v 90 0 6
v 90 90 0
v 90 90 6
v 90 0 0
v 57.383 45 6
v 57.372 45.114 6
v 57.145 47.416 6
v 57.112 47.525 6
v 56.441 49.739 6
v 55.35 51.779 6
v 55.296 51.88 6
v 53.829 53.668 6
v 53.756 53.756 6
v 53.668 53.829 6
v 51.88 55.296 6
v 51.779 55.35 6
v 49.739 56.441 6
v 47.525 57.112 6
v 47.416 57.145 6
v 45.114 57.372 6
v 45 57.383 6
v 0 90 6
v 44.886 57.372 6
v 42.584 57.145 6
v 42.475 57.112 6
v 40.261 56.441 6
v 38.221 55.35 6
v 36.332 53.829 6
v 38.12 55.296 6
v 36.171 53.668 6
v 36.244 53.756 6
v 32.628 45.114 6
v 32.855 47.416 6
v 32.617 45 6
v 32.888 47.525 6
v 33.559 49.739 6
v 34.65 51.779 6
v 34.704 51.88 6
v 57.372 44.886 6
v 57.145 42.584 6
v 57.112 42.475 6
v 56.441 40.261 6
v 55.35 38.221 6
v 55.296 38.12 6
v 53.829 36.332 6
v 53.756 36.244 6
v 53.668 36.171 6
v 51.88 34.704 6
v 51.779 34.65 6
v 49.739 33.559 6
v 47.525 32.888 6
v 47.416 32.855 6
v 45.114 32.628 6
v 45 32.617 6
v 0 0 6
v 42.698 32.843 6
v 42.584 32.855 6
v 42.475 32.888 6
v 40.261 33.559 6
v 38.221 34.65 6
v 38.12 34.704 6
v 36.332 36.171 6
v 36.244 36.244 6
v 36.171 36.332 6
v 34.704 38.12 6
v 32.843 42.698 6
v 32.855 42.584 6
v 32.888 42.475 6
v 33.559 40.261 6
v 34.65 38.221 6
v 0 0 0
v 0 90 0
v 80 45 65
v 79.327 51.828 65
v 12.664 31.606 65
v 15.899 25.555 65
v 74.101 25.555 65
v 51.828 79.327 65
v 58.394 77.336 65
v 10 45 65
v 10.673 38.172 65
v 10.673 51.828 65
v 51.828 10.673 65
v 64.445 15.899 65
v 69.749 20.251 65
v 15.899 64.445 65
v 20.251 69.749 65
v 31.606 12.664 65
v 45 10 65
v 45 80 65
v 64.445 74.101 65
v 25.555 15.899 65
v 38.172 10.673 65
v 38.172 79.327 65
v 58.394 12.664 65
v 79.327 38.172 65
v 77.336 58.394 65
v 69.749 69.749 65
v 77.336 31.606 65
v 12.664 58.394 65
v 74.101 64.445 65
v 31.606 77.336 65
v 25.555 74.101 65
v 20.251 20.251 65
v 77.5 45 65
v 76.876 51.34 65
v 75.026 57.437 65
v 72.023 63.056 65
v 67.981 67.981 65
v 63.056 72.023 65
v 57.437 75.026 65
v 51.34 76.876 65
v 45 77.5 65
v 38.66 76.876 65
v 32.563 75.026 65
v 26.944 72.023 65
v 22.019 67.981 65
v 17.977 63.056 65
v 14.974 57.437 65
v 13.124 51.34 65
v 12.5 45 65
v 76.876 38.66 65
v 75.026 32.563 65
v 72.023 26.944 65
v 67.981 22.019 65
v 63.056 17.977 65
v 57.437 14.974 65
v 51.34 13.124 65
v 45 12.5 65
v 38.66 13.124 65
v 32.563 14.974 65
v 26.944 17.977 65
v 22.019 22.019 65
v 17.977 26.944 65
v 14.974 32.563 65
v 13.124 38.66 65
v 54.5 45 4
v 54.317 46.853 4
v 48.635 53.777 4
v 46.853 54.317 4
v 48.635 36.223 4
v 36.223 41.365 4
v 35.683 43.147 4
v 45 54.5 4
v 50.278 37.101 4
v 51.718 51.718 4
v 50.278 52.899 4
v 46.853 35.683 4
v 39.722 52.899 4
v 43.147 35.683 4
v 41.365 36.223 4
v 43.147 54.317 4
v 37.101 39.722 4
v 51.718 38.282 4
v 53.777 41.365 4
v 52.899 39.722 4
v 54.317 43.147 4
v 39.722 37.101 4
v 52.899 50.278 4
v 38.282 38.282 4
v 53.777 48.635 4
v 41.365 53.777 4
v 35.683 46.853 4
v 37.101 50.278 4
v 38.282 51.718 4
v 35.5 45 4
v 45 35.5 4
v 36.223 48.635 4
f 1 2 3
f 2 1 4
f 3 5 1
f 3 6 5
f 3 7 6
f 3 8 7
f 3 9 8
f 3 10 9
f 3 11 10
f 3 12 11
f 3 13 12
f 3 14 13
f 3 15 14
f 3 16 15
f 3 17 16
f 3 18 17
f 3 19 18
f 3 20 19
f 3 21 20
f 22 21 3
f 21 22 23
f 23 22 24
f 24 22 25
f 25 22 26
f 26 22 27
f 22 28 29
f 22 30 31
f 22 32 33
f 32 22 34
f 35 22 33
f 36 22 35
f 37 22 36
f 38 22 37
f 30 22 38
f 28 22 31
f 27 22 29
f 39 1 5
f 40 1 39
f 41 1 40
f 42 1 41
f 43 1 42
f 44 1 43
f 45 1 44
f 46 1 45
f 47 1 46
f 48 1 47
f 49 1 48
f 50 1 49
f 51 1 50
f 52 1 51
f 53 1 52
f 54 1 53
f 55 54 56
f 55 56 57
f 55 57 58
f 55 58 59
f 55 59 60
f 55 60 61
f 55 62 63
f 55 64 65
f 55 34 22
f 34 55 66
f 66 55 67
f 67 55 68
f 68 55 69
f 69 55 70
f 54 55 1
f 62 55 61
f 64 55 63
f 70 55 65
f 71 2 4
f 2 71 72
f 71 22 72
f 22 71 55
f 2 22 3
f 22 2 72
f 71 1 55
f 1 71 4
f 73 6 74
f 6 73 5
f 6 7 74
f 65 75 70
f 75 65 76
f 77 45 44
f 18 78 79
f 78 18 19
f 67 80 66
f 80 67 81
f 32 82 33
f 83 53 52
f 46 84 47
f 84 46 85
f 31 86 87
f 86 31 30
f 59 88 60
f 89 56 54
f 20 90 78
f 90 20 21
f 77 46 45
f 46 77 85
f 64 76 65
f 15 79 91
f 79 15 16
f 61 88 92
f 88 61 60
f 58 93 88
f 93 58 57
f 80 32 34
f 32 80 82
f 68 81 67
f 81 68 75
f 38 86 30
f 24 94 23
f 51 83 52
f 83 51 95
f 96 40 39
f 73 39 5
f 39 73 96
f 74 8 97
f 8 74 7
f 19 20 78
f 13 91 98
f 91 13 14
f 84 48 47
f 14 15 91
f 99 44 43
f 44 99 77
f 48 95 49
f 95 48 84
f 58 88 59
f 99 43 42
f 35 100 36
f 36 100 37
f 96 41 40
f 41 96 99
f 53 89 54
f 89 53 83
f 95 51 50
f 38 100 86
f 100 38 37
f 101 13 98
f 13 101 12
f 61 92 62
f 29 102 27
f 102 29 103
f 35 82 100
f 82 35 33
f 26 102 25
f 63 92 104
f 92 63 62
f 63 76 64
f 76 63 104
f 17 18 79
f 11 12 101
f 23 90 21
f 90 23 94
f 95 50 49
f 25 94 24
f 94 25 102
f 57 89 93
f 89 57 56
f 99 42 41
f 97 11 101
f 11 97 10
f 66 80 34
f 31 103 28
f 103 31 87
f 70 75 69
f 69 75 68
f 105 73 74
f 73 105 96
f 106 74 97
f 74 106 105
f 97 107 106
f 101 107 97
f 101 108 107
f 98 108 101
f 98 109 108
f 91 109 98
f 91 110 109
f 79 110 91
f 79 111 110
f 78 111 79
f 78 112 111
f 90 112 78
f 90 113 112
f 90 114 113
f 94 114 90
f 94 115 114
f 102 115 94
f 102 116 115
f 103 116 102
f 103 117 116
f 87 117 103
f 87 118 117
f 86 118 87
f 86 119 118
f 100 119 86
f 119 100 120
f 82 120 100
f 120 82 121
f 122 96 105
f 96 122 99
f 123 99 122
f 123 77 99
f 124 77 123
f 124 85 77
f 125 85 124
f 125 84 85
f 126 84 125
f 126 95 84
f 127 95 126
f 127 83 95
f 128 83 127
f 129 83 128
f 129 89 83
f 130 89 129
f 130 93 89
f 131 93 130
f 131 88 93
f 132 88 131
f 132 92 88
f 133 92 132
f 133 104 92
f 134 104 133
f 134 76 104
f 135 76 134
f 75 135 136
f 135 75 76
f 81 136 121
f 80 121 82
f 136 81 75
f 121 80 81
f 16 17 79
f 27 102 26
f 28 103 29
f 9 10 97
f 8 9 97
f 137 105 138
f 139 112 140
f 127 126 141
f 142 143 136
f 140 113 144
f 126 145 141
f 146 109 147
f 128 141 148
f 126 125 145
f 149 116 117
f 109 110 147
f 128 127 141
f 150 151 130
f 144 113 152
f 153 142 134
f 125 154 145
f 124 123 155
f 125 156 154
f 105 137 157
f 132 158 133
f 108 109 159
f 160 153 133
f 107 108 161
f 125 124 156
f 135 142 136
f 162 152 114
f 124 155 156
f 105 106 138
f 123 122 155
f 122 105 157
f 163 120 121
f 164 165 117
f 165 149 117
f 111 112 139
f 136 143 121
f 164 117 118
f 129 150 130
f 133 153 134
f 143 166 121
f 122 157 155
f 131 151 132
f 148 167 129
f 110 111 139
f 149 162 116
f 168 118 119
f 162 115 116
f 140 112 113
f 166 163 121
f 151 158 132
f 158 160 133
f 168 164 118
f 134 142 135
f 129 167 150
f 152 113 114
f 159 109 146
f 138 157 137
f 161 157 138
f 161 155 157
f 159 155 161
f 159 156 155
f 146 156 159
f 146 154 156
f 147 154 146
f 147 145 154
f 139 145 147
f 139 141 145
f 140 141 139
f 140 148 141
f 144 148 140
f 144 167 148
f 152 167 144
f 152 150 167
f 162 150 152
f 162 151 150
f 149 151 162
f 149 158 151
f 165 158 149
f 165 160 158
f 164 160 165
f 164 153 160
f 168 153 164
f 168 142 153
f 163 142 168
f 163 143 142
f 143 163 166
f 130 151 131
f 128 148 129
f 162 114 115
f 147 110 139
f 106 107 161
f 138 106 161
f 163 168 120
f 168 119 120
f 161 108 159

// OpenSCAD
$fn = 32;

// ----------------------------------------------------------------------
// Hopper: funnel with square flange
// ----------------------------------------------------------------------

// --- parameters (mm) ---
fl = 90;                  // flange side, X and Y
fl_t = 6;                 // flange thickness
cone_h = 60;              // cone height above the flange
top_d = 70;               // cone mouth diameter
bot_d = 24;               // cone spout diameter
wall = 2.5;               // cone wall thickness

bore_d = bot_d - 2 * wall;  // spout bore diameter
total_h = fl_t + cone_h - 1;  // overall height

difference() {
  union() {
    cube([fl, fl, fl_t]);
    translate([fl / 2, fl / 2, fl_t - 1])
      cylinder(h = cone_h, d1 = bot_d, d2 = top_d);
  }
  translate([fl / 2, fl / 2, fl_t - 2])
    cylinder(h = cone_h + 1, d1 = bore_d, d2 = top_d - 2 * wall);
}
